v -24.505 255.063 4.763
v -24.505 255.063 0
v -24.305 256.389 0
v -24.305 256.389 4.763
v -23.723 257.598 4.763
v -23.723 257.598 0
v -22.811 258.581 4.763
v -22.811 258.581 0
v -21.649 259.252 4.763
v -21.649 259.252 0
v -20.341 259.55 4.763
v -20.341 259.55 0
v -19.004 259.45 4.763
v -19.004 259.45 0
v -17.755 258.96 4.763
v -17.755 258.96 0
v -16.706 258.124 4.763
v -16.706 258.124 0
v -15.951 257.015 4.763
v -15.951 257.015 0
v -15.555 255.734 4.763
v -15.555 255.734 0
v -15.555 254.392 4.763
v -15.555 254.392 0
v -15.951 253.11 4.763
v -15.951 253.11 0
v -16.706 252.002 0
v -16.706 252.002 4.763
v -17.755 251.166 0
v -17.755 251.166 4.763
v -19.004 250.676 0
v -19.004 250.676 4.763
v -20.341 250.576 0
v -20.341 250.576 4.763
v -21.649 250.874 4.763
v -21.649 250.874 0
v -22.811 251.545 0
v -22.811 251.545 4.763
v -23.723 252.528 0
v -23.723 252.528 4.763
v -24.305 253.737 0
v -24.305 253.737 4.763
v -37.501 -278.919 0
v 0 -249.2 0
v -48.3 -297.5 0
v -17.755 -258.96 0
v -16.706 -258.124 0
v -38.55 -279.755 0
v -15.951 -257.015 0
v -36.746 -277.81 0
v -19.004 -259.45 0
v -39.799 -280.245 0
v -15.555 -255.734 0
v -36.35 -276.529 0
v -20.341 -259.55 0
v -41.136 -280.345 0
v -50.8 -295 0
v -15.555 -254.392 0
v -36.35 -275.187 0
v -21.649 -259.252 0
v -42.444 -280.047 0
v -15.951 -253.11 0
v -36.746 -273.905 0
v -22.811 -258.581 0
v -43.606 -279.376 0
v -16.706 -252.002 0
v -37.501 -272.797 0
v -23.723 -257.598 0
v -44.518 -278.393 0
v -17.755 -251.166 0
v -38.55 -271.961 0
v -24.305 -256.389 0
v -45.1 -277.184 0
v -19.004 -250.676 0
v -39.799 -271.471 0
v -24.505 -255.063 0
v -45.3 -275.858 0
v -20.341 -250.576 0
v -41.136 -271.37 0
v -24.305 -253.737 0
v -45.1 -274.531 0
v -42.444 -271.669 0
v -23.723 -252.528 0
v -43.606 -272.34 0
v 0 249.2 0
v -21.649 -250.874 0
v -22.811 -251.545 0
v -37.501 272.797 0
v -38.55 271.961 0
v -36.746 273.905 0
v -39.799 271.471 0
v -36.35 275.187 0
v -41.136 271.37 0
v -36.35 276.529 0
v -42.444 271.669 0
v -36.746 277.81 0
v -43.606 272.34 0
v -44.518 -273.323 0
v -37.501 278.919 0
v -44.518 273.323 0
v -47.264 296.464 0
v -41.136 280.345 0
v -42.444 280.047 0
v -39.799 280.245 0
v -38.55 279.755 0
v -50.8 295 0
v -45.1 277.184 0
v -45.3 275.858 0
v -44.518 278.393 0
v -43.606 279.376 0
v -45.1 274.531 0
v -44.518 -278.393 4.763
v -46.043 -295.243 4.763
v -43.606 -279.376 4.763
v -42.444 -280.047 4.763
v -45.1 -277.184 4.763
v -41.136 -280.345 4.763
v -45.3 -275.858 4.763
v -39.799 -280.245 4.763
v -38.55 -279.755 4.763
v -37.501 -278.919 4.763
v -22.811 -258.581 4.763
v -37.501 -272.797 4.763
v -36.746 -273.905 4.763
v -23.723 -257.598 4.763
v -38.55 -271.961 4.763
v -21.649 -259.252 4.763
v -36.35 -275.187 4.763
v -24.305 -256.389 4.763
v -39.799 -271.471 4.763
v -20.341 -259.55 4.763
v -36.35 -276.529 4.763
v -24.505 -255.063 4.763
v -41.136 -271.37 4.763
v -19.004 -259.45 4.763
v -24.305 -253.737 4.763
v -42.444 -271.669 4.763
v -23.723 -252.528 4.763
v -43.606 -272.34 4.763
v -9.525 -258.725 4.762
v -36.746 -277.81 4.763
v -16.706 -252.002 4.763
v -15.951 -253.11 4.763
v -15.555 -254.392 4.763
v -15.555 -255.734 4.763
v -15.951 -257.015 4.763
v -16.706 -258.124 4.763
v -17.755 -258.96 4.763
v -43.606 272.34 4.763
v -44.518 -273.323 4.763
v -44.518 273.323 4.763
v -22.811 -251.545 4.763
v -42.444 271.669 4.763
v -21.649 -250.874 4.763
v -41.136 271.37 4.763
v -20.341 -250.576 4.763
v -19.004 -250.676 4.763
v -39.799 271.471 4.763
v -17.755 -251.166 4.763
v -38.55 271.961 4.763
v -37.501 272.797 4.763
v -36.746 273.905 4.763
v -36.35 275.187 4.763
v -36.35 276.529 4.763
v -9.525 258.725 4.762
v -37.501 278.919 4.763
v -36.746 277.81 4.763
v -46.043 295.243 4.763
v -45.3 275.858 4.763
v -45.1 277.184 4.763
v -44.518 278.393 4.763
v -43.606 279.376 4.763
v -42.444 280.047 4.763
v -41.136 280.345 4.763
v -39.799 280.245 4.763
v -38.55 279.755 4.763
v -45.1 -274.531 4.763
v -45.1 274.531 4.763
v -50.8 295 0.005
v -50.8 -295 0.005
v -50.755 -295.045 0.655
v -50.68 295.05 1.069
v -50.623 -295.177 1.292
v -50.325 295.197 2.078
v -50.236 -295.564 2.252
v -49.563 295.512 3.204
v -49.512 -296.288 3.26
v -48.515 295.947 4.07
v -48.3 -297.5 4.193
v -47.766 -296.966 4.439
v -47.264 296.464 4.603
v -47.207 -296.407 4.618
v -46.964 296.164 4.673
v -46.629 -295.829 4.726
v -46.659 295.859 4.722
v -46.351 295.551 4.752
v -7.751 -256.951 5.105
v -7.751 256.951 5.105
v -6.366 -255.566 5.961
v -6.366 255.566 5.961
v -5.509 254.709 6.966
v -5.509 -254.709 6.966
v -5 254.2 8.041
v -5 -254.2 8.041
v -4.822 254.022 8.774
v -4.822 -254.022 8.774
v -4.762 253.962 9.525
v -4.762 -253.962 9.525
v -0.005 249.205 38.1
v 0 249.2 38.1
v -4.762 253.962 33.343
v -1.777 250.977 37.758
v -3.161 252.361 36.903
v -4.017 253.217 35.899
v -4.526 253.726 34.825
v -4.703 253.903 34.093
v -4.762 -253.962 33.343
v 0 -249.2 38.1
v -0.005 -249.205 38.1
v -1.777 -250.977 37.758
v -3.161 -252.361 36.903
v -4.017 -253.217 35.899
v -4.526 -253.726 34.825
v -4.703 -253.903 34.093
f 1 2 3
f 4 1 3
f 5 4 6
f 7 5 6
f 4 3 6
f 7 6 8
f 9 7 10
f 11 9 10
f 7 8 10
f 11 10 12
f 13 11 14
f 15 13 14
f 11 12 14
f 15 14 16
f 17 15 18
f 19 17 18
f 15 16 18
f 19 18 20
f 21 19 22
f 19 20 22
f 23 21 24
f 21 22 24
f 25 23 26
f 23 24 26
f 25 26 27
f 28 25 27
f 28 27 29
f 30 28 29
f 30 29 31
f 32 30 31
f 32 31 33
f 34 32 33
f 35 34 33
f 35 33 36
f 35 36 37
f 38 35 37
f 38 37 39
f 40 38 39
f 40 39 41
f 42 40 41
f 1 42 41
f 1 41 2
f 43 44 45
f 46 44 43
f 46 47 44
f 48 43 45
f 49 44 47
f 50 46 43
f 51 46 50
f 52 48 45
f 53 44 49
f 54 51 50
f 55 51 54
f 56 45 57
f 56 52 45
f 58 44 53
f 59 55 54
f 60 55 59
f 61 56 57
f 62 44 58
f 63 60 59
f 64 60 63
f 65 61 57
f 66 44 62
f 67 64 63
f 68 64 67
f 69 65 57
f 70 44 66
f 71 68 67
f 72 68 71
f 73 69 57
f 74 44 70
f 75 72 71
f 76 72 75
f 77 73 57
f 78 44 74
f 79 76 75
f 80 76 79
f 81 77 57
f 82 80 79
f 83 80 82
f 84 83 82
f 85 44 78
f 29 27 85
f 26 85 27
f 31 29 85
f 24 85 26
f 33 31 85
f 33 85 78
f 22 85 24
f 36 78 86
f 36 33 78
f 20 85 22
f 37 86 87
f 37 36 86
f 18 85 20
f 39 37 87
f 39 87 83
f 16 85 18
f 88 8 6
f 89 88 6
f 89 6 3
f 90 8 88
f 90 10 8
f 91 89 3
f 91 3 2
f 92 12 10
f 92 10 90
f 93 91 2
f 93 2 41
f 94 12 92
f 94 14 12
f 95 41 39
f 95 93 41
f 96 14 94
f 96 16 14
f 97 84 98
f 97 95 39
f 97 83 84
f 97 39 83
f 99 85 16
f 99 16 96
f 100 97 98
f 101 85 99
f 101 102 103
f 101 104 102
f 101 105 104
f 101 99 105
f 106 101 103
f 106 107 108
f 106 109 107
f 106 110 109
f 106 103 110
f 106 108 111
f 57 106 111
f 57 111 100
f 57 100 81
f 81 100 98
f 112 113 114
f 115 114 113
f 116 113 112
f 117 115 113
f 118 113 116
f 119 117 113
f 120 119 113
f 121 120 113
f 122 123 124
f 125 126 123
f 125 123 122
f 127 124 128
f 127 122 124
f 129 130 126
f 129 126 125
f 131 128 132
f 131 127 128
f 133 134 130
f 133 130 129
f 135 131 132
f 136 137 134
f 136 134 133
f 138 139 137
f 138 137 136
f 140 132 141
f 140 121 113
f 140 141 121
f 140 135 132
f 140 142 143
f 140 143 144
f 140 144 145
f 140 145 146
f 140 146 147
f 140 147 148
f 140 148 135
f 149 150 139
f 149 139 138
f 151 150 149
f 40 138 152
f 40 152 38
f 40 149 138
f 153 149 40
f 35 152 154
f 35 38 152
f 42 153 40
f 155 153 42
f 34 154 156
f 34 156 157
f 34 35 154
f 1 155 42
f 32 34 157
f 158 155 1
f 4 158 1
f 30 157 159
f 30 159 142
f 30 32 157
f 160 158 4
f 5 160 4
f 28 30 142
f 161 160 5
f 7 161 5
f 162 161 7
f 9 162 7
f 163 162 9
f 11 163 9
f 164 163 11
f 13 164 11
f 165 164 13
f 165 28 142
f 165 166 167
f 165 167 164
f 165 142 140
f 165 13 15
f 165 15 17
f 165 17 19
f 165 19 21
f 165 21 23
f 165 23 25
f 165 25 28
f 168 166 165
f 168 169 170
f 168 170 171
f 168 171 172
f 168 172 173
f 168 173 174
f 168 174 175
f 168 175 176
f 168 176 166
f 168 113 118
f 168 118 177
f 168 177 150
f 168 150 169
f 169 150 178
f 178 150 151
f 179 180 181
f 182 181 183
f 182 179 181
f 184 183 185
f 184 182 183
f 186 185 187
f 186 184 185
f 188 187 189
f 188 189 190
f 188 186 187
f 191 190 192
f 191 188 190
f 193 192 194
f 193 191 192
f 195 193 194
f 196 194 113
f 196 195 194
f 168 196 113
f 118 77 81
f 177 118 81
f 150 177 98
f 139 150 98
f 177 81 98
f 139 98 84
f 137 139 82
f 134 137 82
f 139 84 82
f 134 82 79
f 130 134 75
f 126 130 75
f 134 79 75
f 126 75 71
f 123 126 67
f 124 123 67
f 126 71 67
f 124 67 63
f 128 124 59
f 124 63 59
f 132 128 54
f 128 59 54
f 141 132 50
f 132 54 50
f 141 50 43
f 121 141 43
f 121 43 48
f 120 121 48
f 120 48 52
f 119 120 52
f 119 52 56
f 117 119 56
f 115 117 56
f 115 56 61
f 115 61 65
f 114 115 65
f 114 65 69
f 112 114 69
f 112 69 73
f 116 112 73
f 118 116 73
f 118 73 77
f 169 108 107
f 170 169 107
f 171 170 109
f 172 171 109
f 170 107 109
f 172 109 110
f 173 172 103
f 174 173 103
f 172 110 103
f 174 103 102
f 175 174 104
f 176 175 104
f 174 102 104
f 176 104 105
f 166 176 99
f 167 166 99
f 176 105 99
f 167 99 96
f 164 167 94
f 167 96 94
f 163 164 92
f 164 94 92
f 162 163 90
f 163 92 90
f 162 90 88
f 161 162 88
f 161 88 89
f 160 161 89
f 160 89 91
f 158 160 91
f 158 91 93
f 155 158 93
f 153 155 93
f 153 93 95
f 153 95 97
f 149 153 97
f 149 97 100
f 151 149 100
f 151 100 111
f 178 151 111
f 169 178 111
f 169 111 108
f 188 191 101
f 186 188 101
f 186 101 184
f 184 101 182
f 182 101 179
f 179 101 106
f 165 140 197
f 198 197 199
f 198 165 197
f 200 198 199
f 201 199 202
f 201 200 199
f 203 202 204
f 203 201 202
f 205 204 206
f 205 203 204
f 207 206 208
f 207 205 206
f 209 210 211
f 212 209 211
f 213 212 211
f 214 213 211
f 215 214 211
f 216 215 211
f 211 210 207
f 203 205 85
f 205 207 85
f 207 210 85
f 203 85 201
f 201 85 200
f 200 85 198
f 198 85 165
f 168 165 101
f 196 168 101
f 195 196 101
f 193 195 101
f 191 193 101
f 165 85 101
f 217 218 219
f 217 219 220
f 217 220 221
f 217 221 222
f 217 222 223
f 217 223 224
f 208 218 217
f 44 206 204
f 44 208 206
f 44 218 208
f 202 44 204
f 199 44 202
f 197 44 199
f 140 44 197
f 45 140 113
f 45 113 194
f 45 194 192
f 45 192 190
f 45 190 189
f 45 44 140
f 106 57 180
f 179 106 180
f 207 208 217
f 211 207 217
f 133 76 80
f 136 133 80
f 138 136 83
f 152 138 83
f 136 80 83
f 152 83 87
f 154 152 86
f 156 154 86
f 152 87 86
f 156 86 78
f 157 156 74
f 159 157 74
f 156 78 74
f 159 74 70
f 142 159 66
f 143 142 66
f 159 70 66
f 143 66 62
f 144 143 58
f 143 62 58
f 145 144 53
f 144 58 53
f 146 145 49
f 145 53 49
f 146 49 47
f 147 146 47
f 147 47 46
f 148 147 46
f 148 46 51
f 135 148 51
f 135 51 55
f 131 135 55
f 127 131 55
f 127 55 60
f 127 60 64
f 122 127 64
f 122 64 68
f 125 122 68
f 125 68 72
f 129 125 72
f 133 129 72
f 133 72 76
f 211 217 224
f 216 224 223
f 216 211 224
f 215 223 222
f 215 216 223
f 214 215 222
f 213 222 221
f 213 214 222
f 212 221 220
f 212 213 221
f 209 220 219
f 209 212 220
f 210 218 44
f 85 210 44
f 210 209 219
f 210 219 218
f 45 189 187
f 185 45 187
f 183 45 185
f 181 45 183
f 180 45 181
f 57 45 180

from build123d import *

# Parameters (mm, degrees)
L_ANGLE_L2X1_5X0_1875_1_DEPTH = 600
CUT_EXTRUDE1_REACH            = 308.647
M8_CLEARANCE_HOLE1_D          = 9


with BuildPart() as part:
    # Sketch14 → L angle L2X1.5X0.1875(1) (new body)
    with BuildSketch(Plane(origin=(0, 300, 0), x_dir=(0, 0, 1), z_dir=(0, -1, 0))):
        with BuildLine():
            Line((0, 0), (0, 50.8))
            Line((0, 50.8), (0.00508, 50.8))
            ThreePointArc((0.00508, 50.8), (3.369083943, 49.406583943), (4.7625, 46.04258))
            Line((4.7625, 46.04258), (4.7625, 9.525))
            ThreePointArc((4.7625, 9.525), (6.157403955, 6.157403955), (9.525, 4.7625))
            Line((9.525, 4.7625), (33.34258, 4.7625))
            ThreePointArc((33.34258, 4.7625), (36.706583943, 3.369083943), (38.1, 0.00508))
            Line((38.1, 0.00508), (38.1, 0))
            Line((38.1, 0), (0, 0))
        make_face()
    extrude(amount=L_ANGLE_L2X1_5X0_1875_1_DEPTH)

    # Sketch15 → Cut-Extrude1 (cut, up to next)
    with BuildSketch(Plane.XY, mode=Mode.PRIVATE) as cut_extrude1_sk1:
        Polygon((-50.8, -300), (0, -300), (0, -249.2), (-48.3, -297.5), (-50.8, -295), align=None)
    cut_extrude1_tool1 = extrude(cut_extrude1_sk1.sketch, amount=CUT_EXTRUDE1_REACH, mode=Mode.PRIVATE) & part.part
    # Sketch15 → Cut-Extrude1 (cut, up to next)
    with BuildSketch(Plane.XY, mode=Mode.PRIVATE) as cut_extrude1_sk2:
        Polygon((-50.8, 300), (0, 300), (0, 249.2), (-47.264466094, 296.464466094), (-50.8, 295), align=None)
    cut_extrude1_tool2 = extrude(cut_extrude1_sk2.sketch, amount=CUT_EXTRUDE1_REACH, mode=Mode.PRIVATE) & part.part
    add(cut_extrude1_tool1.solids().sort_by_distance((-17.092568, -283.136241, 0))[0], mode=Mode.SUBTRACT)
    add(cut_extrude1_tool2.solids().sort_by_distance((-17.155727, 283.162516, 0))[0], mode=Mode.SUBTRACT)

    # M8 Clearance Hole1 (through all)
    with Locations(Plane.XY.offset(4.7625)):
        with Locations((-40.8, 275.857864376), (-20.00508, 255.062944376), (-20.00508, -255.062944376), (-40.8, -275.857864376)):
            Hole(M8_CLEARANCE_HOLE1_D / 2)


solid = part.part
